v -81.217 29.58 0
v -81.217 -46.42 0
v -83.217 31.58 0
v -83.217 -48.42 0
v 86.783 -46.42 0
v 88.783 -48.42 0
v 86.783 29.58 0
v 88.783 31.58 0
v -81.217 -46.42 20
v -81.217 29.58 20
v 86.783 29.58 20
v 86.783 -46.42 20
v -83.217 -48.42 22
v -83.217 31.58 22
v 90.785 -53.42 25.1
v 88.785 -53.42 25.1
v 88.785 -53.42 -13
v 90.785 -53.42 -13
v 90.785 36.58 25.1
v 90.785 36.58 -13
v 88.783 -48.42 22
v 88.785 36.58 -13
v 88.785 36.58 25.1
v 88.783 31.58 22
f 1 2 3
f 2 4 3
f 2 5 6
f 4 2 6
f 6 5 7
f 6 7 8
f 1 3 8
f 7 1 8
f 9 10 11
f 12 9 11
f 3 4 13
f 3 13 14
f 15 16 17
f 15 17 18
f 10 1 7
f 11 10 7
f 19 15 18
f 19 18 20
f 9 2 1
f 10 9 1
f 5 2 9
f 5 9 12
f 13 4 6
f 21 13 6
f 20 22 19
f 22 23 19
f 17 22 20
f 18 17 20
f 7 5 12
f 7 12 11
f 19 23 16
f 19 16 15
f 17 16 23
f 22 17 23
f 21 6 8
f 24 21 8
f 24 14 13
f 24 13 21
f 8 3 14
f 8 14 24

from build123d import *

# Parameters (mm, degrees)
F0_W     = 172
F0_H     = 80
F1_DEPTH = 22
F2_T     = -2
F3_W     = 2
F3_H     = 90
F4_DEPTH = 22.1
F5_DEPTH = 3
F6_DEPTH = 3
F7_DEPTH = 10


with BuildPart() as f1:
    # F0 (on Top) → F1 (new body)
    with BuildSketch(Plane.XY):
        with Locations((2.7826657335, -8.4195947275)):
            Rectangle(F0_W, F0_H)
    extrude(amount=F1_DEPTH)

    # F2
    f2_openings = [f1.faces().sort_by_distance(p)[0] for p in [
        (2.782666, -8.419595, 0),
    ]]
    offset(amount=F2_T, openings=f2_openings)


with BuildPart() as f4:
    # F3 (on Top) → F4 (new body)
    with BuildSketch(Plane.XY):
        with Locations((89.7852818131, -8.4195947275)):
            Rectangle(F3_W, F3_H)
    extrude(amount=F4_DEPTH)

    # F5 (add): a face of the model
    f5_faces = [f4.faces().sort_by_distance(p)[0] for p in [
        (89.7852818131, -8.4195947275, 0),
    ]]
    extrude(f5_faces, amount=F5_DEPTH)

    # F6 (add): a face of the model
    f6_faces = [f4.faces().sort_by_distance(p)[0] for p in [
        (89.7852818131, -8.4195947275, 22.1),
    ]]
    extrude(f6_faces, amount=F6_DEPTH)

    # F7 (add): a face of the model
    f7_faces = [f4.faces().sort_by_distance(p)[0] for p in [
        (89.7852818131, -8.4195947275, -3),
    ]]
    extrude(f7_faces, amount=F7_DEPTH)


solid = Compound([f1.part, f4.part])
